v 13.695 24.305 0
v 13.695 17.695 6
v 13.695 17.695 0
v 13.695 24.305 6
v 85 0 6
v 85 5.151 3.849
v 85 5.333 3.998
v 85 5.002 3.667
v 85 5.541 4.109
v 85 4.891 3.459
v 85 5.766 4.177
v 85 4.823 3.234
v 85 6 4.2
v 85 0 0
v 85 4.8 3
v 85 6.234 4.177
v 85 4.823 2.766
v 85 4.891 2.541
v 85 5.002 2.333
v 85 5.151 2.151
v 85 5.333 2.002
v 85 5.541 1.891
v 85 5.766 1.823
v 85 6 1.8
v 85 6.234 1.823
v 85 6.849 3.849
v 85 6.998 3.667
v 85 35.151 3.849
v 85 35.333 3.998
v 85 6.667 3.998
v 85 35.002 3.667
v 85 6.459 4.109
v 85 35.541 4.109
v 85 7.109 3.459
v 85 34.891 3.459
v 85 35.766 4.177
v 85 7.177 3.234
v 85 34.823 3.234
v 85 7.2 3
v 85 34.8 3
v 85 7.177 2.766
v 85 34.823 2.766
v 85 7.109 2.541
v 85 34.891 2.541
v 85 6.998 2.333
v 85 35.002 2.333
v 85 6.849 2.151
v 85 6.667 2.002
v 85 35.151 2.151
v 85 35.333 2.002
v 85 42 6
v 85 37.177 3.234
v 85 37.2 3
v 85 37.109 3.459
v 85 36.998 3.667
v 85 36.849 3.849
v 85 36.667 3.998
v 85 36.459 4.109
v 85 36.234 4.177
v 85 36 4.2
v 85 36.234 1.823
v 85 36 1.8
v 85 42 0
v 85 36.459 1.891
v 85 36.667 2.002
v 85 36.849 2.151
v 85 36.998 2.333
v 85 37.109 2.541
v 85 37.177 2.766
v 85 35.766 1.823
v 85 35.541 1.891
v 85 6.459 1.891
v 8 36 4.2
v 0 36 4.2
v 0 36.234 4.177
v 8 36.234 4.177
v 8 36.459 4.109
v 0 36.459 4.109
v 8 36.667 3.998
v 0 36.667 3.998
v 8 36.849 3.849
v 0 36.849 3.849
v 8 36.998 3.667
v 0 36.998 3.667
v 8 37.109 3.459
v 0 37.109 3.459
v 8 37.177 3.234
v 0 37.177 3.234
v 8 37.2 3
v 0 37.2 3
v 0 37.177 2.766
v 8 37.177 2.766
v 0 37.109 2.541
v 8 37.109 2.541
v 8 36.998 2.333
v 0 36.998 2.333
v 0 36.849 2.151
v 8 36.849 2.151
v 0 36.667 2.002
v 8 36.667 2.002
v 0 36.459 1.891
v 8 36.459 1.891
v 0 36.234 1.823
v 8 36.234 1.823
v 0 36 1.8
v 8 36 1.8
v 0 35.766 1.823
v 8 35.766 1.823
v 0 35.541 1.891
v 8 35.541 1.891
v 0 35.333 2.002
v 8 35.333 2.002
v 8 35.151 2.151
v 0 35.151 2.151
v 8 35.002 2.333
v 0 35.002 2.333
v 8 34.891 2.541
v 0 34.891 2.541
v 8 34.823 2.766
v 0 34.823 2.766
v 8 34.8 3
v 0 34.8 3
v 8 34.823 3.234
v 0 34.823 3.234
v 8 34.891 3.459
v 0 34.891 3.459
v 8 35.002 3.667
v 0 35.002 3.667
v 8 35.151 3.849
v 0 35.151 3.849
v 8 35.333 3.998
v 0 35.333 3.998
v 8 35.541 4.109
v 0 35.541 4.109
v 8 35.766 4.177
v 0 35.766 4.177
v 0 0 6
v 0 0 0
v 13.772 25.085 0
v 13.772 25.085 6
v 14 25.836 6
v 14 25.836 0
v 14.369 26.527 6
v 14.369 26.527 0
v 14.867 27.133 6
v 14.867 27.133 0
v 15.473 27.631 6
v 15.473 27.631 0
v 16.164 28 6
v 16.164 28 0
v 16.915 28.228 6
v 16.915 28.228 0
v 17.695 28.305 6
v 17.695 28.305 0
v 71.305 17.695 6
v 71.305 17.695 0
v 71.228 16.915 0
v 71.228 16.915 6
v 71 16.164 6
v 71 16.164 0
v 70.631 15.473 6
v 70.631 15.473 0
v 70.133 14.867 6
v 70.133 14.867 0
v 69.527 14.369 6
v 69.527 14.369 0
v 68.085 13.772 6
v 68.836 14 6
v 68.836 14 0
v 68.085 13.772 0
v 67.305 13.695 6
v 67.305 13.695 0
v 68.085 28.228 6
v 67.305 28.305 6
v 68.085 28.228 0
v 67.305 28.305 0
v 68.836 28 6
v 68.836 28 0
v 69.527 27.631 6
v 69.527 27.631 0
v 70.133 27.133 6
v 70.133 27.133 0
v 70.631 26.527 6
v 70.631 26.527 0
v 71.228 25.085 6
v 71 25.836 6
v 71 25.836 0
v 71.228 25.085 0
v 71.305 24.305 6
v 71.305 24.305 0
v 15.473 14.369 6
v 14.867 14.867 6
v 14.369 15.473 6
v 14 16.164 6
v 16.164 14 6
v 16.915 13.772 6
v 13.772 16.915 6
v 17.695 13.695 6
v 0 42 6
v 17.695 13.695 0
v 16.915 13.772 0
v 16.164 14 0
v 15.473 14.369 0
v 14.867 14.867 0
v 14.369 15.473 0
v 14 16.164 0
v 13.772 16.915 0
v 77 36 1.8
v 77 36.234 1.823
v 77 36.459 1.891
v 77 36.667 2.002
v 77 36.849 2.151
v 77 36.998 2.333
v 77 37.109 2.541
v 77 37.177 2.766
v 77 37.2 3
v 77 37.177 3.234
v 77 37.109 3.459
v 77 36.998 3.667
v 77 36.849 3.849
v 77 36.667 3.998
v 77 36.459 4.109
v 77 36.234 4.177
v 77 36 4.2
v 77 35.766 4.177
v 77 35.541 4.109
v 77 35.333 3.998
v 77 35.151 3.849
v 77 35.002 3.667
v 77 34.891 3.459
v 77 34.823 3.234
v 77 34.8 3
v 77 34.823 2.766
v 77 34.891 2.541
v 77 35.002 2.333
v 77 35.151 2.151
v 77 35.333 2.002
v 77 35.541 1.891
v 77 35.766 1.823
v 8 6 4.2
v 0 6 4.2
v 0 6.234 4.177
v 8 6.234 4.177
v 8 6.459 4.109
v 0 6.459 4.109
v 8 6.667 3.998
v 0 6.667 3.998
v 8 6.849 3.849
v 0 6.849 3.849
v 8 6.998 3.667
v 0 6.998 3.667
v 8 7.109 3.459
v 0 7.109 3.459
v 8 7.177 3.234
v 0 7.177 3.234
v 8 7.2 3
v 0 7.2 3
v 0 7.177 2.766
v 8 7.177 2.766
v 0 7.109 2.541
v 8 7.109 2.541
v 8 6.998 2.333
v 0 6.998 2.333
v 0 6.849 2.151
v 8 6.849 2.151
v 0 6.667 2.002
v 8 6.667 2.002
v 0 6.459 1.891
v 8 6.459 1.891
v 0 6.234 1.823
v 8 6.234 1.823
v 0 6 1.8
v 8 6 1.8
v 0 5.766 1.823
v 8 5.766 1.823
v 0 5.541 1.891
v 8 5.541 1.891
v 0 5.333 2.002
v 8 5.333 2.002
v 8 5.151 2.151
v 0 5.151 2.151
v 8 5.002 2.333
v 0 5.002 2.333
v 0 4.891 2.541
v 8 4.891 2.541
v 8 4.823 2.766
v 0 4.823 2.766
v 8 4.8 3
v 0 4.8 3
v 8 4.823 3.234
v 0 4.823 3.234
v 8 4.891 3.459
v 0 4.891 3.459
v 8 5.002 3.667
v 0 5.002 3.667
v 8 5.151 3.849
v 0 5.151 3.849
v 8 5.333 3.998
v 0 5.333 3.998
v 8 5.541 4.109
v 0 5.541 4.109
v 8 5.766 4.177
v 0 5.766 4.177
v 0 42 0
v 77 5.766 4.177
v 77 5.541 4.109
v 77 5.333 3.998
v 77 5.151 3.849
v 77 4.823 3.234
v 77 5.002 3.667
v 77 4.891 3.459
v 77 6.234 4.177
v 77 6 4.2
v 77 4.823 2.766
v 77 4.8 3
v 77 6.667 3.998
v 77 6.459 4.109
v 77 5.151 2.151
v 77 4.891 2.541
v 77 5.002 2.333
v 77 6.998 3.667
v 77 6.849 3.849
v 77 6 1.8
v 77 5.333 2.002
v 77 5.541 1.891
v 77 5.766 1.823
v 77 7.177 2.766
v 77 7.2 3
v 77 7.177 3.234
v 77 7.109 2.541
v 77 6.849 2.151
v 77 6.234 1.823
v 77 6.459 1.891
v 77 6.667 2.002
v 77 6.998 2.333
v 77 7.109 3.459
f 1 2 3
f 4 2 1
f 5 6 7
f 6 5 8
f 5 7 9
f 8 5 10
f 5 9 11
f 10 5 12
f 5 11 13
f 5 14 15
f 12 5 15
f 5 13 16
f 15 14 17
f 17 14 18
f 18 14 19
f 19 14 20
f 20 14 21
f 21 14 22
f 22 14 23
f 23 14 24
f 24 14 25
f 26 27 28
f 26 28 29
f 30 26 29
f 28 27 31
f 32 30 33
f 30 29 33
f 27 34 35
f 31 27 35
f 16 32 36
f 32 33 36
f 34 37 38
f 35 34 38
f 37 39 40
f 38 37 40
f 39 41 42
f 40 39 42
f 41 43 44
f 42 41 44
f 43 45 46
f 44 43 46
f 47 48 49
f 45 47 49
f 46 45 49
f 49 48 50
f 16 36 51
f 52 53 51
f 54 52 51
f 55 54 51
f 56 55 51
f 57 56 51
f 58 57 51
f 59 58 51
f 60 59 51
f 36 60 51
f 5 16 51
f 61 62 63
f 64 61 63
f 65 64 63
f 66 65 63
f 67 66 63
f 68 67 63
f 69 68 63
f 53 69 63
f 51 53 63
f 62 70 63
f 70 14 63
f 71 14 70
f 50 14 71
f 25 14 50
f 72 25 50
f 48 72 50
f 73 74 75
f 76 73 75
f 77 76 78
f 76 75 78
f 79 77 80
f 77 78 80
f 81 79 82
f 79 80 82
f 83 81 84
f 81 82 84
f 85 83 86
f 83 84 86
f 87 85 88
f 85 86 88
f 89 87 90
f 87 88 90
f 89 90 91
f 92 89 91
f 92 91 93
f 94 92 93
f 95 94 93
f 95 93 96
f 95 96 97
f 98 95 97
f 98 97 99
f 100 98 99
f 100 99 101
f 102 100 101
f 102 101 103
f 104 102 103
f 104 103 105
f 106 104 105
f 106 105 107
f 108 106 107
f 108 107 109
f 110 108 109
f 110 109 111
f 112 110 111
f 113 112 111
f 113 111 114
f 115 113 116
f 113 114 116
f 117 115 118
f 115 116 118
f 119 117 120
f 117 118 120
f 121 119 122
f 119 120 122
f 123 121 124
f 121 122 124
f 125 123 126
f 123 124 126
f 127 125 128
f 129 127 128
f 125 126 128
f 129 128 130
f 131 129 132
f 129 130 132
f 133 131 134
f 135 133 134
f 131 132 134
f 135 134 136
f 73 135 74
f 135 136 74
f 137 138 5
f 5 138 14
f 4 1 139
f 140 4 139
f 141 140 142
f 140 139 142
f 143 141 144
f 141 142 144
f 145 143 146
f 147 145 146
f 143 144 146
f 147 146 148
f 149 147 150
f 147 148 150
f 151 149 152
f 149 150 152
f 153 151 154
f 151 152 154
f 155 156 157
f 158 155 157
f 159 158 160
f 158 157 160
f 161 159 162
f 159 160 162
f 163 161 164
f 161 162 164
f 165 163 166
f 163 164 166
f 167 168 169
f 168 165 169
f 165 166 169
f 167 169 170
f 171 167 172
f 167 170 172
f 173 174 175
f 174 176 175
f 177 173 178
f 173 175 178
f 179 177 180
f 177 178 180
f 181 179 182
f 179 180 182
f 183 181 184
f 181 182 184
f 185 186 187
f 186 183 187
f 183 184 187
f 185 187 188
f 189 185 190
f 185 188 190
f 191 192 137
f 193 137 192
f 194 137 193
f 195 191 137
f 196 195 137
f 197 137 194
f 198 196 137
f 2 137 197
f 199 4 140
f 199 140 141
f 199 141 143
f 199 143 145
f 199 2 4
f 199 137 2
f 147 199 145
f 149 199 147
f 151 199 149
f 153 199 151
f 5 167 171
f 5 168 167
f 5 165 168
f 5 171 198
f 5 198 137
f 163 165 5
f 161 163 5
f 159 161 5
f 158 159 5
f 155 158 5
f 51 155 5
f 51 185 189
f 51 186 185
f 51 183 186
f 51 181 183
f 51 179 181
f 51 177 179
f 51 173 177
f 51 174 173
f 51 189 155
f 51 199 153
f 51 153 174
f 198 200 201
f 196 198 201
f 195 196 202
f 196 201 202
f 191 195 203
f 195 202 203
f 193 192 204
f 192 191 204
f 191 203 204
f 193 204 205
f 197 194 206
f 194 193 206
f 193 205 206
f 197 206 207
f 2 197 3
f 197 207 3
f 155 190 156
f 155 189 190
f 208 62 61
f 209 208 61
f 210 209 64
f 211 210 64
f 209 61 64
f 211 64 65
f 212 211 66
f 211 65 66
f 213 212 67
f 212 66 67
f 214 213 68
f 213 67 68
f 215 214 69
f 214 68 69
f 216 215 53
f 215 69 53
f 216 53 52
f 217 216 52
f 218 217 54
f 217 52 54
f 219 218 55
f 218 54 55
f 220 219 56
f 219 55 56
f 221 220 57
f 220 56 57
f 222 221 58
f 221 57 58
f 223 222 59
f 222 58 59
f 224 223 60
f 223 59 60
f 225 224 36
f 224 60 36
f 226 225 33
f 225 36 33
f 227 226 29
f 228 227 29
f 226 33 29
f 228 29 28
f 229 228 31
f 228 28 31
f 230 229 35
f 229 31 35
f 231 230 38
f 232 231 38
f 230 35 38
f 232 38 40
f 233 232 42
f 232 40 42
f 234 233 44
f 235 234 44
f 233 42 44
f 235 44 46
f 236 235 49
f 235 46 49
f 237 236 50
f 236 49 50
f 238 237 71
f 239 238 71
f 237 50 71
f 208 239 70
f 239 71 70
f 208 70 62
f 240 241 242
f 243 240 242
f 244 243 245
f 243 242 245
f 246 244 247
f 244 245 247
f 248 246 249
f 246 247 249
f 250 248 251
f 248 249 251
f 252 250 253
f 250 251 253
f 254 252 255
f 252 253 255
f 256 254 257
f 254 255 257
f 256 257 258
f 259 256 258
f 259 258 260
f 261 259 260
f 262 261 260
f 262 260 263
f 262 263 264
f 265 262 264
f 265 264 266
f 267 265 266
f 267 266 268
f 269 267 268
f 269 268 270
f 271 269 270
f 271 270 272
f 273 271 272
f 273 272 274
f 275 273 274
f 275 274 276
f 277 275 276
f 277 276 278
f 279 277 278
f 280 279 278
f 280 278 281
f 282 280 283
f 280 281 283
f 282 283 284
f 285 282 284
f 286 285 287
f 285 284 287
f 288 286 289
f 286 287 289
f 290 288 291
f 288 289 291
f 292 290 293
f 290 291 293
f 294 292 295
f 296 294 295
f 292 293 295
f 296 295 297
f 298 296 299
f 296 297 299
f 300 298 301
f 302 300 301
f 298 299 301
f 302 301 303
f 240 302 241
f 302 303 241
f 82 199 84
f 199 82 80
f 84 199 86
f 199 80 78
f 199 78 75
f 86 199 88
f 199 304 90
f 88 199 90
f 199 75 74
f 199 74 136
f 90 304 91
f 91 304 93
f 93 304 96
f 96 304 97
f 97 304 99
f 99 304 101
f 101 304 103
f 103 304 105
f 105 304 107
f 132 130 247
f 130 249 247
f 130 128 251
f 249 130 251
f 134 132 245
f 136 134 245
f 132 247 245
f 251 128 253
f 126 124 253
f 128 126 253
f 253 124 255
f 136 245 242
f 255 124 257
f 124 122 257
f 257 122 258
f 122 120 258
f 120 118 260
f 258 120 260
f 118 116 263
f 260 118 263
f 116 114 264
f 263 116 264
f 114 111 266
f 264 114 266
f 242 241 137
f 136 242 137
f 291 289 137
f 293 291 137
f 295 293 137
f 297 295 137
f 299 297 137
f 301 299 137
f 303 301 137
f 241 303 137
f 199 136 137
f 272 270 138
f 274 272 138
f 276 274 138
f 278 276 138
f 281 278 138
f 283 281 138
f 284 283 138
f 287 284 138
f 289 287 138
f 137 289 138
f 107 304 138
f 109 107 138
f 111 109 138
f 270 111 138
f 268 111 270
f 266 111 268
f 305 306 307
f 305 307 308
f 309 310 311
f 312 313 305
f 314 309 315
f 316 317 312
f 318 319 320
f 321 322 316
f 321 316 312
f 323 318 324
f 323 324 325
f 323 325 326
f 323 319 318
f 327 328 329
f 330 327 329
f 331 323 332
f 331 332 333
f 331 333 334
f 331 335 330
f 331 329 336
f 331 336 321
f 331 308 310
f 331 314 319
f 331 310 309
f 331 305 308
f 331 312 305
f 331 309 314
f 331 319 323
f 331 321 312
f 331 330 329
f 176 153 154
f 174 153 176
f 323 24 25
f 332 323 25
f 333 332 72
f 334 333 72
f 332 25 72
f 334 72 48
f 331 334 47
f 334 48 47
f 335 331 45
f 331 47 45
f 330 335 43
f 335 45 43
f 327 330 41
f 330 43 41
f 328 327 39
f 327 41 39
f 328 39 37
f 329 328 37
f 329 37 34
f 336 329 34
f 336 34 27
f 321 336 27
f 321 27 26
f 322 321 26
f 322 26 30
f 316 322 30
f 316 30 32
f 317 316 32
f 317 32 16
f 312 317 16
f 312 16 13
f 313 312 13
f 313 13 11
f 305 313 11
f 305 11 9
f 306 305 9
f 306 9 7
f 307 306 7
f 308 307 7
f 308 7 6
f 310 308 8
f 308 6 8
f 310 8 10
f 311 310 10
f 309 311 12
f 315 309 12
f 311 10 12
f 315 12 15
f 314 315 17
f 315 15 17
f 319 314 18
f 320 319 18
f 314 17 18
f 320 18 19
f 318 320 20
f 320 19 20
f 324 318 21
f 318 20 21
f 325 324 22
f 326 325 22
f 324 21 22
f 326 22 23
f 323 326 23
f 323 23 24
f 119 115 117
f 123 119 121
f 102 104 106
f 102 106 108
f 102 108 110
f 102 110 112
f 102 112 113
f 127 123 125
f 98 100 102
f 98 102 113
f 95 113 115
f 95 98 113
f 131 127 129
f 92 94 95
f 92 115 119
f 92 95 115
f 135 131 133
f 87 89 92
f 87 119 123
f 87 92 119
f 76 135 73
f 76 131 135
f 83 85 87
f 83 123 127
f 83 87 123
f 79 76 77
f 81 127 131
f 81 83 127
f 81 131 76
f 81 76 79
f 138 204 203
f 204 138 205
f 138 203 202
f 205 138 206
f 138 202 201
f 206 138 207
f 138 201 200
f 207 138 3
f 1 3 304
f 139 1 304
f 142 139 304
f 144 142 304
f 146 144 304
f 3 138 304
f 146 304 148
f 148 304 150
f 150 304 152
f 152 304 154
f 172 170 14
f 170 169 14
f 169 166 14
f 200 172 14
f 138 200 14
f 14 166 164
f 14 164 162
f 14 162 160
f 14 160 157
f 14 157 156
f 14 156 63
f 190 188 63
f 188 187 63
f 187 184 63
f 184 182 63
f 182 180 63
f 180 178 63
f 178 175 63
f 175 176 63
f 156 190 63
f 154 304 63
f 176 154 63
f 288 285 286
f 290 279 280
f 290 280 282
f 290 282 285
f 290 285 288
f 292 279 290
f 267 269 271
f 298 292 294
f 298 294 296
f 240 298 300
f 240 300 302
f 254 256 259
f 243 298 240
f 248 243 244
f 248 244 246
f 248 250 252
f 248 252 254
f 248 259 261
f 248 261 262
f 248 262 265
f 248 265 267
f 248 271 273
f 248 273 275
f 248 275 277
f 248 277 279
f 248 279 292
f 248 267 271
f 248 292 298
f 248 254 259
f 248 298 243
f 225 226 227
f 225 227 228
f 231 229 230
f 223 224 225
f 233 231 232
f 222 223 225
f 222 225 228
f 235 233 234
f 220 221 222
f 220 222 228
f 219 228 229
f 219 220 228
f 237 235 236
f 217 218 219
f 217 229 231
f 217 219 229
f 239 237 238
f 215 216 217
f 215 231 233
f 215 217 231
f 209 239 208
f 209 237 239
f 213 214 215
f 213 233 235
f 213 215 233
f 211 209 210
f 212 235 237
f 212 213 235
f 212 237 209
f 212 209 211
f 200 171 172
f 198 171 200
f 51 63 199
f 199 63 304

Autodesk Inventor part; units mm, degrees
ref_plane "YZ Plane" through (0, 0, 0) normal (1, 0, 0) x (0, 1, 0)
ref_plane "XZ Plane" through (0, 0, 0) normal (0, 1, 0) x (-1, 0, 0)
ref_plane "XY Plane" through (0, 0, 0) normal (0, 0, 1) x (1, 0, 0)
sketch "スケッチ1" plane through (0, 0, 0) normal (0, 0, 1) x (1, 0, 0)
  line L0 (0, 0) -> (85, 0)
  line L1 (85, 0) -> (85, 42)
  line L2 (85, 42) -> (0, 42)
  line L3 (0, 42) -> (0, 0)
  dimension "d0" = 85
  dimension "d1" = 42
extrude "押し出し1" add sketch "スケッチ1" along normal blind 6
sketch "スケッチ2" plane through (0, 0, 0) normal (-1, 0, 0) x (0, 0, 1)
  circle A0 centre (3, 36) radius 1.2
  circle A1 centre (3, 6) radius 1.2
  line L0 (0, 42) -> (6, 42) projected
  line L1 (0, 0) -> (6, 0) projected
  dimension "d4" = 2.4
  dimension "d5" = 2.4
  dimension "d6" = 6
  dimension "d7" = 6
extrude "押し出し2" cut sketch "スケッチ2" against normal blind 8
sketch "スケッチ3" plane through (85, 0, 0) normal (1, 0, 0) x (0, 0, -1)
  circle A0 centre (-3, 6) radius 1.2 projected
  circle A1 centre (-3, 6) radius 1.2
  circle A2 centre (-3, 36) radius 1.2 projected
  circle A3 centre (-3, 36) radius 1.2
  point P0 (0, 0)
extrude "押し出し3" cut sketch "スケッチ3" against normal blind 8
sketch "スケッチ4" plane through (0, 0, 6) normal (0, 0, 1) x (1, 0, 0)
  line L0 (0, 0) -> (85, 0) projected
  line L1 (85, 0) -> (85, 42) projected
  line L2 (85, 42) -> (0, 42) projected
  line L3 (0, 42) -> (0, 0) projected
  line L4 (13.6951, 28.3049) -> (71.3049, 28.3049)
  line L5 (71.3049, 28.3049) -> (71.3049, 13.6951)
  line L6 (71.3049, 13.6951) -> (13.6951, 13.6951)
  line L7 (13.6951, 13.6951) -> (13.6951, 28.3049)
extrude "押し出し4" cut sketch "スケッチ4" against normal blind 10 contours L4 L5 L6 L7
fillet "フィレット1" radius 4 4 edges at (13.6951, 28.3049, 3) (13.6951, 13.6951, 3) (71.3049, 13.6951, 3) (71.3049, 28.3049, 3)
